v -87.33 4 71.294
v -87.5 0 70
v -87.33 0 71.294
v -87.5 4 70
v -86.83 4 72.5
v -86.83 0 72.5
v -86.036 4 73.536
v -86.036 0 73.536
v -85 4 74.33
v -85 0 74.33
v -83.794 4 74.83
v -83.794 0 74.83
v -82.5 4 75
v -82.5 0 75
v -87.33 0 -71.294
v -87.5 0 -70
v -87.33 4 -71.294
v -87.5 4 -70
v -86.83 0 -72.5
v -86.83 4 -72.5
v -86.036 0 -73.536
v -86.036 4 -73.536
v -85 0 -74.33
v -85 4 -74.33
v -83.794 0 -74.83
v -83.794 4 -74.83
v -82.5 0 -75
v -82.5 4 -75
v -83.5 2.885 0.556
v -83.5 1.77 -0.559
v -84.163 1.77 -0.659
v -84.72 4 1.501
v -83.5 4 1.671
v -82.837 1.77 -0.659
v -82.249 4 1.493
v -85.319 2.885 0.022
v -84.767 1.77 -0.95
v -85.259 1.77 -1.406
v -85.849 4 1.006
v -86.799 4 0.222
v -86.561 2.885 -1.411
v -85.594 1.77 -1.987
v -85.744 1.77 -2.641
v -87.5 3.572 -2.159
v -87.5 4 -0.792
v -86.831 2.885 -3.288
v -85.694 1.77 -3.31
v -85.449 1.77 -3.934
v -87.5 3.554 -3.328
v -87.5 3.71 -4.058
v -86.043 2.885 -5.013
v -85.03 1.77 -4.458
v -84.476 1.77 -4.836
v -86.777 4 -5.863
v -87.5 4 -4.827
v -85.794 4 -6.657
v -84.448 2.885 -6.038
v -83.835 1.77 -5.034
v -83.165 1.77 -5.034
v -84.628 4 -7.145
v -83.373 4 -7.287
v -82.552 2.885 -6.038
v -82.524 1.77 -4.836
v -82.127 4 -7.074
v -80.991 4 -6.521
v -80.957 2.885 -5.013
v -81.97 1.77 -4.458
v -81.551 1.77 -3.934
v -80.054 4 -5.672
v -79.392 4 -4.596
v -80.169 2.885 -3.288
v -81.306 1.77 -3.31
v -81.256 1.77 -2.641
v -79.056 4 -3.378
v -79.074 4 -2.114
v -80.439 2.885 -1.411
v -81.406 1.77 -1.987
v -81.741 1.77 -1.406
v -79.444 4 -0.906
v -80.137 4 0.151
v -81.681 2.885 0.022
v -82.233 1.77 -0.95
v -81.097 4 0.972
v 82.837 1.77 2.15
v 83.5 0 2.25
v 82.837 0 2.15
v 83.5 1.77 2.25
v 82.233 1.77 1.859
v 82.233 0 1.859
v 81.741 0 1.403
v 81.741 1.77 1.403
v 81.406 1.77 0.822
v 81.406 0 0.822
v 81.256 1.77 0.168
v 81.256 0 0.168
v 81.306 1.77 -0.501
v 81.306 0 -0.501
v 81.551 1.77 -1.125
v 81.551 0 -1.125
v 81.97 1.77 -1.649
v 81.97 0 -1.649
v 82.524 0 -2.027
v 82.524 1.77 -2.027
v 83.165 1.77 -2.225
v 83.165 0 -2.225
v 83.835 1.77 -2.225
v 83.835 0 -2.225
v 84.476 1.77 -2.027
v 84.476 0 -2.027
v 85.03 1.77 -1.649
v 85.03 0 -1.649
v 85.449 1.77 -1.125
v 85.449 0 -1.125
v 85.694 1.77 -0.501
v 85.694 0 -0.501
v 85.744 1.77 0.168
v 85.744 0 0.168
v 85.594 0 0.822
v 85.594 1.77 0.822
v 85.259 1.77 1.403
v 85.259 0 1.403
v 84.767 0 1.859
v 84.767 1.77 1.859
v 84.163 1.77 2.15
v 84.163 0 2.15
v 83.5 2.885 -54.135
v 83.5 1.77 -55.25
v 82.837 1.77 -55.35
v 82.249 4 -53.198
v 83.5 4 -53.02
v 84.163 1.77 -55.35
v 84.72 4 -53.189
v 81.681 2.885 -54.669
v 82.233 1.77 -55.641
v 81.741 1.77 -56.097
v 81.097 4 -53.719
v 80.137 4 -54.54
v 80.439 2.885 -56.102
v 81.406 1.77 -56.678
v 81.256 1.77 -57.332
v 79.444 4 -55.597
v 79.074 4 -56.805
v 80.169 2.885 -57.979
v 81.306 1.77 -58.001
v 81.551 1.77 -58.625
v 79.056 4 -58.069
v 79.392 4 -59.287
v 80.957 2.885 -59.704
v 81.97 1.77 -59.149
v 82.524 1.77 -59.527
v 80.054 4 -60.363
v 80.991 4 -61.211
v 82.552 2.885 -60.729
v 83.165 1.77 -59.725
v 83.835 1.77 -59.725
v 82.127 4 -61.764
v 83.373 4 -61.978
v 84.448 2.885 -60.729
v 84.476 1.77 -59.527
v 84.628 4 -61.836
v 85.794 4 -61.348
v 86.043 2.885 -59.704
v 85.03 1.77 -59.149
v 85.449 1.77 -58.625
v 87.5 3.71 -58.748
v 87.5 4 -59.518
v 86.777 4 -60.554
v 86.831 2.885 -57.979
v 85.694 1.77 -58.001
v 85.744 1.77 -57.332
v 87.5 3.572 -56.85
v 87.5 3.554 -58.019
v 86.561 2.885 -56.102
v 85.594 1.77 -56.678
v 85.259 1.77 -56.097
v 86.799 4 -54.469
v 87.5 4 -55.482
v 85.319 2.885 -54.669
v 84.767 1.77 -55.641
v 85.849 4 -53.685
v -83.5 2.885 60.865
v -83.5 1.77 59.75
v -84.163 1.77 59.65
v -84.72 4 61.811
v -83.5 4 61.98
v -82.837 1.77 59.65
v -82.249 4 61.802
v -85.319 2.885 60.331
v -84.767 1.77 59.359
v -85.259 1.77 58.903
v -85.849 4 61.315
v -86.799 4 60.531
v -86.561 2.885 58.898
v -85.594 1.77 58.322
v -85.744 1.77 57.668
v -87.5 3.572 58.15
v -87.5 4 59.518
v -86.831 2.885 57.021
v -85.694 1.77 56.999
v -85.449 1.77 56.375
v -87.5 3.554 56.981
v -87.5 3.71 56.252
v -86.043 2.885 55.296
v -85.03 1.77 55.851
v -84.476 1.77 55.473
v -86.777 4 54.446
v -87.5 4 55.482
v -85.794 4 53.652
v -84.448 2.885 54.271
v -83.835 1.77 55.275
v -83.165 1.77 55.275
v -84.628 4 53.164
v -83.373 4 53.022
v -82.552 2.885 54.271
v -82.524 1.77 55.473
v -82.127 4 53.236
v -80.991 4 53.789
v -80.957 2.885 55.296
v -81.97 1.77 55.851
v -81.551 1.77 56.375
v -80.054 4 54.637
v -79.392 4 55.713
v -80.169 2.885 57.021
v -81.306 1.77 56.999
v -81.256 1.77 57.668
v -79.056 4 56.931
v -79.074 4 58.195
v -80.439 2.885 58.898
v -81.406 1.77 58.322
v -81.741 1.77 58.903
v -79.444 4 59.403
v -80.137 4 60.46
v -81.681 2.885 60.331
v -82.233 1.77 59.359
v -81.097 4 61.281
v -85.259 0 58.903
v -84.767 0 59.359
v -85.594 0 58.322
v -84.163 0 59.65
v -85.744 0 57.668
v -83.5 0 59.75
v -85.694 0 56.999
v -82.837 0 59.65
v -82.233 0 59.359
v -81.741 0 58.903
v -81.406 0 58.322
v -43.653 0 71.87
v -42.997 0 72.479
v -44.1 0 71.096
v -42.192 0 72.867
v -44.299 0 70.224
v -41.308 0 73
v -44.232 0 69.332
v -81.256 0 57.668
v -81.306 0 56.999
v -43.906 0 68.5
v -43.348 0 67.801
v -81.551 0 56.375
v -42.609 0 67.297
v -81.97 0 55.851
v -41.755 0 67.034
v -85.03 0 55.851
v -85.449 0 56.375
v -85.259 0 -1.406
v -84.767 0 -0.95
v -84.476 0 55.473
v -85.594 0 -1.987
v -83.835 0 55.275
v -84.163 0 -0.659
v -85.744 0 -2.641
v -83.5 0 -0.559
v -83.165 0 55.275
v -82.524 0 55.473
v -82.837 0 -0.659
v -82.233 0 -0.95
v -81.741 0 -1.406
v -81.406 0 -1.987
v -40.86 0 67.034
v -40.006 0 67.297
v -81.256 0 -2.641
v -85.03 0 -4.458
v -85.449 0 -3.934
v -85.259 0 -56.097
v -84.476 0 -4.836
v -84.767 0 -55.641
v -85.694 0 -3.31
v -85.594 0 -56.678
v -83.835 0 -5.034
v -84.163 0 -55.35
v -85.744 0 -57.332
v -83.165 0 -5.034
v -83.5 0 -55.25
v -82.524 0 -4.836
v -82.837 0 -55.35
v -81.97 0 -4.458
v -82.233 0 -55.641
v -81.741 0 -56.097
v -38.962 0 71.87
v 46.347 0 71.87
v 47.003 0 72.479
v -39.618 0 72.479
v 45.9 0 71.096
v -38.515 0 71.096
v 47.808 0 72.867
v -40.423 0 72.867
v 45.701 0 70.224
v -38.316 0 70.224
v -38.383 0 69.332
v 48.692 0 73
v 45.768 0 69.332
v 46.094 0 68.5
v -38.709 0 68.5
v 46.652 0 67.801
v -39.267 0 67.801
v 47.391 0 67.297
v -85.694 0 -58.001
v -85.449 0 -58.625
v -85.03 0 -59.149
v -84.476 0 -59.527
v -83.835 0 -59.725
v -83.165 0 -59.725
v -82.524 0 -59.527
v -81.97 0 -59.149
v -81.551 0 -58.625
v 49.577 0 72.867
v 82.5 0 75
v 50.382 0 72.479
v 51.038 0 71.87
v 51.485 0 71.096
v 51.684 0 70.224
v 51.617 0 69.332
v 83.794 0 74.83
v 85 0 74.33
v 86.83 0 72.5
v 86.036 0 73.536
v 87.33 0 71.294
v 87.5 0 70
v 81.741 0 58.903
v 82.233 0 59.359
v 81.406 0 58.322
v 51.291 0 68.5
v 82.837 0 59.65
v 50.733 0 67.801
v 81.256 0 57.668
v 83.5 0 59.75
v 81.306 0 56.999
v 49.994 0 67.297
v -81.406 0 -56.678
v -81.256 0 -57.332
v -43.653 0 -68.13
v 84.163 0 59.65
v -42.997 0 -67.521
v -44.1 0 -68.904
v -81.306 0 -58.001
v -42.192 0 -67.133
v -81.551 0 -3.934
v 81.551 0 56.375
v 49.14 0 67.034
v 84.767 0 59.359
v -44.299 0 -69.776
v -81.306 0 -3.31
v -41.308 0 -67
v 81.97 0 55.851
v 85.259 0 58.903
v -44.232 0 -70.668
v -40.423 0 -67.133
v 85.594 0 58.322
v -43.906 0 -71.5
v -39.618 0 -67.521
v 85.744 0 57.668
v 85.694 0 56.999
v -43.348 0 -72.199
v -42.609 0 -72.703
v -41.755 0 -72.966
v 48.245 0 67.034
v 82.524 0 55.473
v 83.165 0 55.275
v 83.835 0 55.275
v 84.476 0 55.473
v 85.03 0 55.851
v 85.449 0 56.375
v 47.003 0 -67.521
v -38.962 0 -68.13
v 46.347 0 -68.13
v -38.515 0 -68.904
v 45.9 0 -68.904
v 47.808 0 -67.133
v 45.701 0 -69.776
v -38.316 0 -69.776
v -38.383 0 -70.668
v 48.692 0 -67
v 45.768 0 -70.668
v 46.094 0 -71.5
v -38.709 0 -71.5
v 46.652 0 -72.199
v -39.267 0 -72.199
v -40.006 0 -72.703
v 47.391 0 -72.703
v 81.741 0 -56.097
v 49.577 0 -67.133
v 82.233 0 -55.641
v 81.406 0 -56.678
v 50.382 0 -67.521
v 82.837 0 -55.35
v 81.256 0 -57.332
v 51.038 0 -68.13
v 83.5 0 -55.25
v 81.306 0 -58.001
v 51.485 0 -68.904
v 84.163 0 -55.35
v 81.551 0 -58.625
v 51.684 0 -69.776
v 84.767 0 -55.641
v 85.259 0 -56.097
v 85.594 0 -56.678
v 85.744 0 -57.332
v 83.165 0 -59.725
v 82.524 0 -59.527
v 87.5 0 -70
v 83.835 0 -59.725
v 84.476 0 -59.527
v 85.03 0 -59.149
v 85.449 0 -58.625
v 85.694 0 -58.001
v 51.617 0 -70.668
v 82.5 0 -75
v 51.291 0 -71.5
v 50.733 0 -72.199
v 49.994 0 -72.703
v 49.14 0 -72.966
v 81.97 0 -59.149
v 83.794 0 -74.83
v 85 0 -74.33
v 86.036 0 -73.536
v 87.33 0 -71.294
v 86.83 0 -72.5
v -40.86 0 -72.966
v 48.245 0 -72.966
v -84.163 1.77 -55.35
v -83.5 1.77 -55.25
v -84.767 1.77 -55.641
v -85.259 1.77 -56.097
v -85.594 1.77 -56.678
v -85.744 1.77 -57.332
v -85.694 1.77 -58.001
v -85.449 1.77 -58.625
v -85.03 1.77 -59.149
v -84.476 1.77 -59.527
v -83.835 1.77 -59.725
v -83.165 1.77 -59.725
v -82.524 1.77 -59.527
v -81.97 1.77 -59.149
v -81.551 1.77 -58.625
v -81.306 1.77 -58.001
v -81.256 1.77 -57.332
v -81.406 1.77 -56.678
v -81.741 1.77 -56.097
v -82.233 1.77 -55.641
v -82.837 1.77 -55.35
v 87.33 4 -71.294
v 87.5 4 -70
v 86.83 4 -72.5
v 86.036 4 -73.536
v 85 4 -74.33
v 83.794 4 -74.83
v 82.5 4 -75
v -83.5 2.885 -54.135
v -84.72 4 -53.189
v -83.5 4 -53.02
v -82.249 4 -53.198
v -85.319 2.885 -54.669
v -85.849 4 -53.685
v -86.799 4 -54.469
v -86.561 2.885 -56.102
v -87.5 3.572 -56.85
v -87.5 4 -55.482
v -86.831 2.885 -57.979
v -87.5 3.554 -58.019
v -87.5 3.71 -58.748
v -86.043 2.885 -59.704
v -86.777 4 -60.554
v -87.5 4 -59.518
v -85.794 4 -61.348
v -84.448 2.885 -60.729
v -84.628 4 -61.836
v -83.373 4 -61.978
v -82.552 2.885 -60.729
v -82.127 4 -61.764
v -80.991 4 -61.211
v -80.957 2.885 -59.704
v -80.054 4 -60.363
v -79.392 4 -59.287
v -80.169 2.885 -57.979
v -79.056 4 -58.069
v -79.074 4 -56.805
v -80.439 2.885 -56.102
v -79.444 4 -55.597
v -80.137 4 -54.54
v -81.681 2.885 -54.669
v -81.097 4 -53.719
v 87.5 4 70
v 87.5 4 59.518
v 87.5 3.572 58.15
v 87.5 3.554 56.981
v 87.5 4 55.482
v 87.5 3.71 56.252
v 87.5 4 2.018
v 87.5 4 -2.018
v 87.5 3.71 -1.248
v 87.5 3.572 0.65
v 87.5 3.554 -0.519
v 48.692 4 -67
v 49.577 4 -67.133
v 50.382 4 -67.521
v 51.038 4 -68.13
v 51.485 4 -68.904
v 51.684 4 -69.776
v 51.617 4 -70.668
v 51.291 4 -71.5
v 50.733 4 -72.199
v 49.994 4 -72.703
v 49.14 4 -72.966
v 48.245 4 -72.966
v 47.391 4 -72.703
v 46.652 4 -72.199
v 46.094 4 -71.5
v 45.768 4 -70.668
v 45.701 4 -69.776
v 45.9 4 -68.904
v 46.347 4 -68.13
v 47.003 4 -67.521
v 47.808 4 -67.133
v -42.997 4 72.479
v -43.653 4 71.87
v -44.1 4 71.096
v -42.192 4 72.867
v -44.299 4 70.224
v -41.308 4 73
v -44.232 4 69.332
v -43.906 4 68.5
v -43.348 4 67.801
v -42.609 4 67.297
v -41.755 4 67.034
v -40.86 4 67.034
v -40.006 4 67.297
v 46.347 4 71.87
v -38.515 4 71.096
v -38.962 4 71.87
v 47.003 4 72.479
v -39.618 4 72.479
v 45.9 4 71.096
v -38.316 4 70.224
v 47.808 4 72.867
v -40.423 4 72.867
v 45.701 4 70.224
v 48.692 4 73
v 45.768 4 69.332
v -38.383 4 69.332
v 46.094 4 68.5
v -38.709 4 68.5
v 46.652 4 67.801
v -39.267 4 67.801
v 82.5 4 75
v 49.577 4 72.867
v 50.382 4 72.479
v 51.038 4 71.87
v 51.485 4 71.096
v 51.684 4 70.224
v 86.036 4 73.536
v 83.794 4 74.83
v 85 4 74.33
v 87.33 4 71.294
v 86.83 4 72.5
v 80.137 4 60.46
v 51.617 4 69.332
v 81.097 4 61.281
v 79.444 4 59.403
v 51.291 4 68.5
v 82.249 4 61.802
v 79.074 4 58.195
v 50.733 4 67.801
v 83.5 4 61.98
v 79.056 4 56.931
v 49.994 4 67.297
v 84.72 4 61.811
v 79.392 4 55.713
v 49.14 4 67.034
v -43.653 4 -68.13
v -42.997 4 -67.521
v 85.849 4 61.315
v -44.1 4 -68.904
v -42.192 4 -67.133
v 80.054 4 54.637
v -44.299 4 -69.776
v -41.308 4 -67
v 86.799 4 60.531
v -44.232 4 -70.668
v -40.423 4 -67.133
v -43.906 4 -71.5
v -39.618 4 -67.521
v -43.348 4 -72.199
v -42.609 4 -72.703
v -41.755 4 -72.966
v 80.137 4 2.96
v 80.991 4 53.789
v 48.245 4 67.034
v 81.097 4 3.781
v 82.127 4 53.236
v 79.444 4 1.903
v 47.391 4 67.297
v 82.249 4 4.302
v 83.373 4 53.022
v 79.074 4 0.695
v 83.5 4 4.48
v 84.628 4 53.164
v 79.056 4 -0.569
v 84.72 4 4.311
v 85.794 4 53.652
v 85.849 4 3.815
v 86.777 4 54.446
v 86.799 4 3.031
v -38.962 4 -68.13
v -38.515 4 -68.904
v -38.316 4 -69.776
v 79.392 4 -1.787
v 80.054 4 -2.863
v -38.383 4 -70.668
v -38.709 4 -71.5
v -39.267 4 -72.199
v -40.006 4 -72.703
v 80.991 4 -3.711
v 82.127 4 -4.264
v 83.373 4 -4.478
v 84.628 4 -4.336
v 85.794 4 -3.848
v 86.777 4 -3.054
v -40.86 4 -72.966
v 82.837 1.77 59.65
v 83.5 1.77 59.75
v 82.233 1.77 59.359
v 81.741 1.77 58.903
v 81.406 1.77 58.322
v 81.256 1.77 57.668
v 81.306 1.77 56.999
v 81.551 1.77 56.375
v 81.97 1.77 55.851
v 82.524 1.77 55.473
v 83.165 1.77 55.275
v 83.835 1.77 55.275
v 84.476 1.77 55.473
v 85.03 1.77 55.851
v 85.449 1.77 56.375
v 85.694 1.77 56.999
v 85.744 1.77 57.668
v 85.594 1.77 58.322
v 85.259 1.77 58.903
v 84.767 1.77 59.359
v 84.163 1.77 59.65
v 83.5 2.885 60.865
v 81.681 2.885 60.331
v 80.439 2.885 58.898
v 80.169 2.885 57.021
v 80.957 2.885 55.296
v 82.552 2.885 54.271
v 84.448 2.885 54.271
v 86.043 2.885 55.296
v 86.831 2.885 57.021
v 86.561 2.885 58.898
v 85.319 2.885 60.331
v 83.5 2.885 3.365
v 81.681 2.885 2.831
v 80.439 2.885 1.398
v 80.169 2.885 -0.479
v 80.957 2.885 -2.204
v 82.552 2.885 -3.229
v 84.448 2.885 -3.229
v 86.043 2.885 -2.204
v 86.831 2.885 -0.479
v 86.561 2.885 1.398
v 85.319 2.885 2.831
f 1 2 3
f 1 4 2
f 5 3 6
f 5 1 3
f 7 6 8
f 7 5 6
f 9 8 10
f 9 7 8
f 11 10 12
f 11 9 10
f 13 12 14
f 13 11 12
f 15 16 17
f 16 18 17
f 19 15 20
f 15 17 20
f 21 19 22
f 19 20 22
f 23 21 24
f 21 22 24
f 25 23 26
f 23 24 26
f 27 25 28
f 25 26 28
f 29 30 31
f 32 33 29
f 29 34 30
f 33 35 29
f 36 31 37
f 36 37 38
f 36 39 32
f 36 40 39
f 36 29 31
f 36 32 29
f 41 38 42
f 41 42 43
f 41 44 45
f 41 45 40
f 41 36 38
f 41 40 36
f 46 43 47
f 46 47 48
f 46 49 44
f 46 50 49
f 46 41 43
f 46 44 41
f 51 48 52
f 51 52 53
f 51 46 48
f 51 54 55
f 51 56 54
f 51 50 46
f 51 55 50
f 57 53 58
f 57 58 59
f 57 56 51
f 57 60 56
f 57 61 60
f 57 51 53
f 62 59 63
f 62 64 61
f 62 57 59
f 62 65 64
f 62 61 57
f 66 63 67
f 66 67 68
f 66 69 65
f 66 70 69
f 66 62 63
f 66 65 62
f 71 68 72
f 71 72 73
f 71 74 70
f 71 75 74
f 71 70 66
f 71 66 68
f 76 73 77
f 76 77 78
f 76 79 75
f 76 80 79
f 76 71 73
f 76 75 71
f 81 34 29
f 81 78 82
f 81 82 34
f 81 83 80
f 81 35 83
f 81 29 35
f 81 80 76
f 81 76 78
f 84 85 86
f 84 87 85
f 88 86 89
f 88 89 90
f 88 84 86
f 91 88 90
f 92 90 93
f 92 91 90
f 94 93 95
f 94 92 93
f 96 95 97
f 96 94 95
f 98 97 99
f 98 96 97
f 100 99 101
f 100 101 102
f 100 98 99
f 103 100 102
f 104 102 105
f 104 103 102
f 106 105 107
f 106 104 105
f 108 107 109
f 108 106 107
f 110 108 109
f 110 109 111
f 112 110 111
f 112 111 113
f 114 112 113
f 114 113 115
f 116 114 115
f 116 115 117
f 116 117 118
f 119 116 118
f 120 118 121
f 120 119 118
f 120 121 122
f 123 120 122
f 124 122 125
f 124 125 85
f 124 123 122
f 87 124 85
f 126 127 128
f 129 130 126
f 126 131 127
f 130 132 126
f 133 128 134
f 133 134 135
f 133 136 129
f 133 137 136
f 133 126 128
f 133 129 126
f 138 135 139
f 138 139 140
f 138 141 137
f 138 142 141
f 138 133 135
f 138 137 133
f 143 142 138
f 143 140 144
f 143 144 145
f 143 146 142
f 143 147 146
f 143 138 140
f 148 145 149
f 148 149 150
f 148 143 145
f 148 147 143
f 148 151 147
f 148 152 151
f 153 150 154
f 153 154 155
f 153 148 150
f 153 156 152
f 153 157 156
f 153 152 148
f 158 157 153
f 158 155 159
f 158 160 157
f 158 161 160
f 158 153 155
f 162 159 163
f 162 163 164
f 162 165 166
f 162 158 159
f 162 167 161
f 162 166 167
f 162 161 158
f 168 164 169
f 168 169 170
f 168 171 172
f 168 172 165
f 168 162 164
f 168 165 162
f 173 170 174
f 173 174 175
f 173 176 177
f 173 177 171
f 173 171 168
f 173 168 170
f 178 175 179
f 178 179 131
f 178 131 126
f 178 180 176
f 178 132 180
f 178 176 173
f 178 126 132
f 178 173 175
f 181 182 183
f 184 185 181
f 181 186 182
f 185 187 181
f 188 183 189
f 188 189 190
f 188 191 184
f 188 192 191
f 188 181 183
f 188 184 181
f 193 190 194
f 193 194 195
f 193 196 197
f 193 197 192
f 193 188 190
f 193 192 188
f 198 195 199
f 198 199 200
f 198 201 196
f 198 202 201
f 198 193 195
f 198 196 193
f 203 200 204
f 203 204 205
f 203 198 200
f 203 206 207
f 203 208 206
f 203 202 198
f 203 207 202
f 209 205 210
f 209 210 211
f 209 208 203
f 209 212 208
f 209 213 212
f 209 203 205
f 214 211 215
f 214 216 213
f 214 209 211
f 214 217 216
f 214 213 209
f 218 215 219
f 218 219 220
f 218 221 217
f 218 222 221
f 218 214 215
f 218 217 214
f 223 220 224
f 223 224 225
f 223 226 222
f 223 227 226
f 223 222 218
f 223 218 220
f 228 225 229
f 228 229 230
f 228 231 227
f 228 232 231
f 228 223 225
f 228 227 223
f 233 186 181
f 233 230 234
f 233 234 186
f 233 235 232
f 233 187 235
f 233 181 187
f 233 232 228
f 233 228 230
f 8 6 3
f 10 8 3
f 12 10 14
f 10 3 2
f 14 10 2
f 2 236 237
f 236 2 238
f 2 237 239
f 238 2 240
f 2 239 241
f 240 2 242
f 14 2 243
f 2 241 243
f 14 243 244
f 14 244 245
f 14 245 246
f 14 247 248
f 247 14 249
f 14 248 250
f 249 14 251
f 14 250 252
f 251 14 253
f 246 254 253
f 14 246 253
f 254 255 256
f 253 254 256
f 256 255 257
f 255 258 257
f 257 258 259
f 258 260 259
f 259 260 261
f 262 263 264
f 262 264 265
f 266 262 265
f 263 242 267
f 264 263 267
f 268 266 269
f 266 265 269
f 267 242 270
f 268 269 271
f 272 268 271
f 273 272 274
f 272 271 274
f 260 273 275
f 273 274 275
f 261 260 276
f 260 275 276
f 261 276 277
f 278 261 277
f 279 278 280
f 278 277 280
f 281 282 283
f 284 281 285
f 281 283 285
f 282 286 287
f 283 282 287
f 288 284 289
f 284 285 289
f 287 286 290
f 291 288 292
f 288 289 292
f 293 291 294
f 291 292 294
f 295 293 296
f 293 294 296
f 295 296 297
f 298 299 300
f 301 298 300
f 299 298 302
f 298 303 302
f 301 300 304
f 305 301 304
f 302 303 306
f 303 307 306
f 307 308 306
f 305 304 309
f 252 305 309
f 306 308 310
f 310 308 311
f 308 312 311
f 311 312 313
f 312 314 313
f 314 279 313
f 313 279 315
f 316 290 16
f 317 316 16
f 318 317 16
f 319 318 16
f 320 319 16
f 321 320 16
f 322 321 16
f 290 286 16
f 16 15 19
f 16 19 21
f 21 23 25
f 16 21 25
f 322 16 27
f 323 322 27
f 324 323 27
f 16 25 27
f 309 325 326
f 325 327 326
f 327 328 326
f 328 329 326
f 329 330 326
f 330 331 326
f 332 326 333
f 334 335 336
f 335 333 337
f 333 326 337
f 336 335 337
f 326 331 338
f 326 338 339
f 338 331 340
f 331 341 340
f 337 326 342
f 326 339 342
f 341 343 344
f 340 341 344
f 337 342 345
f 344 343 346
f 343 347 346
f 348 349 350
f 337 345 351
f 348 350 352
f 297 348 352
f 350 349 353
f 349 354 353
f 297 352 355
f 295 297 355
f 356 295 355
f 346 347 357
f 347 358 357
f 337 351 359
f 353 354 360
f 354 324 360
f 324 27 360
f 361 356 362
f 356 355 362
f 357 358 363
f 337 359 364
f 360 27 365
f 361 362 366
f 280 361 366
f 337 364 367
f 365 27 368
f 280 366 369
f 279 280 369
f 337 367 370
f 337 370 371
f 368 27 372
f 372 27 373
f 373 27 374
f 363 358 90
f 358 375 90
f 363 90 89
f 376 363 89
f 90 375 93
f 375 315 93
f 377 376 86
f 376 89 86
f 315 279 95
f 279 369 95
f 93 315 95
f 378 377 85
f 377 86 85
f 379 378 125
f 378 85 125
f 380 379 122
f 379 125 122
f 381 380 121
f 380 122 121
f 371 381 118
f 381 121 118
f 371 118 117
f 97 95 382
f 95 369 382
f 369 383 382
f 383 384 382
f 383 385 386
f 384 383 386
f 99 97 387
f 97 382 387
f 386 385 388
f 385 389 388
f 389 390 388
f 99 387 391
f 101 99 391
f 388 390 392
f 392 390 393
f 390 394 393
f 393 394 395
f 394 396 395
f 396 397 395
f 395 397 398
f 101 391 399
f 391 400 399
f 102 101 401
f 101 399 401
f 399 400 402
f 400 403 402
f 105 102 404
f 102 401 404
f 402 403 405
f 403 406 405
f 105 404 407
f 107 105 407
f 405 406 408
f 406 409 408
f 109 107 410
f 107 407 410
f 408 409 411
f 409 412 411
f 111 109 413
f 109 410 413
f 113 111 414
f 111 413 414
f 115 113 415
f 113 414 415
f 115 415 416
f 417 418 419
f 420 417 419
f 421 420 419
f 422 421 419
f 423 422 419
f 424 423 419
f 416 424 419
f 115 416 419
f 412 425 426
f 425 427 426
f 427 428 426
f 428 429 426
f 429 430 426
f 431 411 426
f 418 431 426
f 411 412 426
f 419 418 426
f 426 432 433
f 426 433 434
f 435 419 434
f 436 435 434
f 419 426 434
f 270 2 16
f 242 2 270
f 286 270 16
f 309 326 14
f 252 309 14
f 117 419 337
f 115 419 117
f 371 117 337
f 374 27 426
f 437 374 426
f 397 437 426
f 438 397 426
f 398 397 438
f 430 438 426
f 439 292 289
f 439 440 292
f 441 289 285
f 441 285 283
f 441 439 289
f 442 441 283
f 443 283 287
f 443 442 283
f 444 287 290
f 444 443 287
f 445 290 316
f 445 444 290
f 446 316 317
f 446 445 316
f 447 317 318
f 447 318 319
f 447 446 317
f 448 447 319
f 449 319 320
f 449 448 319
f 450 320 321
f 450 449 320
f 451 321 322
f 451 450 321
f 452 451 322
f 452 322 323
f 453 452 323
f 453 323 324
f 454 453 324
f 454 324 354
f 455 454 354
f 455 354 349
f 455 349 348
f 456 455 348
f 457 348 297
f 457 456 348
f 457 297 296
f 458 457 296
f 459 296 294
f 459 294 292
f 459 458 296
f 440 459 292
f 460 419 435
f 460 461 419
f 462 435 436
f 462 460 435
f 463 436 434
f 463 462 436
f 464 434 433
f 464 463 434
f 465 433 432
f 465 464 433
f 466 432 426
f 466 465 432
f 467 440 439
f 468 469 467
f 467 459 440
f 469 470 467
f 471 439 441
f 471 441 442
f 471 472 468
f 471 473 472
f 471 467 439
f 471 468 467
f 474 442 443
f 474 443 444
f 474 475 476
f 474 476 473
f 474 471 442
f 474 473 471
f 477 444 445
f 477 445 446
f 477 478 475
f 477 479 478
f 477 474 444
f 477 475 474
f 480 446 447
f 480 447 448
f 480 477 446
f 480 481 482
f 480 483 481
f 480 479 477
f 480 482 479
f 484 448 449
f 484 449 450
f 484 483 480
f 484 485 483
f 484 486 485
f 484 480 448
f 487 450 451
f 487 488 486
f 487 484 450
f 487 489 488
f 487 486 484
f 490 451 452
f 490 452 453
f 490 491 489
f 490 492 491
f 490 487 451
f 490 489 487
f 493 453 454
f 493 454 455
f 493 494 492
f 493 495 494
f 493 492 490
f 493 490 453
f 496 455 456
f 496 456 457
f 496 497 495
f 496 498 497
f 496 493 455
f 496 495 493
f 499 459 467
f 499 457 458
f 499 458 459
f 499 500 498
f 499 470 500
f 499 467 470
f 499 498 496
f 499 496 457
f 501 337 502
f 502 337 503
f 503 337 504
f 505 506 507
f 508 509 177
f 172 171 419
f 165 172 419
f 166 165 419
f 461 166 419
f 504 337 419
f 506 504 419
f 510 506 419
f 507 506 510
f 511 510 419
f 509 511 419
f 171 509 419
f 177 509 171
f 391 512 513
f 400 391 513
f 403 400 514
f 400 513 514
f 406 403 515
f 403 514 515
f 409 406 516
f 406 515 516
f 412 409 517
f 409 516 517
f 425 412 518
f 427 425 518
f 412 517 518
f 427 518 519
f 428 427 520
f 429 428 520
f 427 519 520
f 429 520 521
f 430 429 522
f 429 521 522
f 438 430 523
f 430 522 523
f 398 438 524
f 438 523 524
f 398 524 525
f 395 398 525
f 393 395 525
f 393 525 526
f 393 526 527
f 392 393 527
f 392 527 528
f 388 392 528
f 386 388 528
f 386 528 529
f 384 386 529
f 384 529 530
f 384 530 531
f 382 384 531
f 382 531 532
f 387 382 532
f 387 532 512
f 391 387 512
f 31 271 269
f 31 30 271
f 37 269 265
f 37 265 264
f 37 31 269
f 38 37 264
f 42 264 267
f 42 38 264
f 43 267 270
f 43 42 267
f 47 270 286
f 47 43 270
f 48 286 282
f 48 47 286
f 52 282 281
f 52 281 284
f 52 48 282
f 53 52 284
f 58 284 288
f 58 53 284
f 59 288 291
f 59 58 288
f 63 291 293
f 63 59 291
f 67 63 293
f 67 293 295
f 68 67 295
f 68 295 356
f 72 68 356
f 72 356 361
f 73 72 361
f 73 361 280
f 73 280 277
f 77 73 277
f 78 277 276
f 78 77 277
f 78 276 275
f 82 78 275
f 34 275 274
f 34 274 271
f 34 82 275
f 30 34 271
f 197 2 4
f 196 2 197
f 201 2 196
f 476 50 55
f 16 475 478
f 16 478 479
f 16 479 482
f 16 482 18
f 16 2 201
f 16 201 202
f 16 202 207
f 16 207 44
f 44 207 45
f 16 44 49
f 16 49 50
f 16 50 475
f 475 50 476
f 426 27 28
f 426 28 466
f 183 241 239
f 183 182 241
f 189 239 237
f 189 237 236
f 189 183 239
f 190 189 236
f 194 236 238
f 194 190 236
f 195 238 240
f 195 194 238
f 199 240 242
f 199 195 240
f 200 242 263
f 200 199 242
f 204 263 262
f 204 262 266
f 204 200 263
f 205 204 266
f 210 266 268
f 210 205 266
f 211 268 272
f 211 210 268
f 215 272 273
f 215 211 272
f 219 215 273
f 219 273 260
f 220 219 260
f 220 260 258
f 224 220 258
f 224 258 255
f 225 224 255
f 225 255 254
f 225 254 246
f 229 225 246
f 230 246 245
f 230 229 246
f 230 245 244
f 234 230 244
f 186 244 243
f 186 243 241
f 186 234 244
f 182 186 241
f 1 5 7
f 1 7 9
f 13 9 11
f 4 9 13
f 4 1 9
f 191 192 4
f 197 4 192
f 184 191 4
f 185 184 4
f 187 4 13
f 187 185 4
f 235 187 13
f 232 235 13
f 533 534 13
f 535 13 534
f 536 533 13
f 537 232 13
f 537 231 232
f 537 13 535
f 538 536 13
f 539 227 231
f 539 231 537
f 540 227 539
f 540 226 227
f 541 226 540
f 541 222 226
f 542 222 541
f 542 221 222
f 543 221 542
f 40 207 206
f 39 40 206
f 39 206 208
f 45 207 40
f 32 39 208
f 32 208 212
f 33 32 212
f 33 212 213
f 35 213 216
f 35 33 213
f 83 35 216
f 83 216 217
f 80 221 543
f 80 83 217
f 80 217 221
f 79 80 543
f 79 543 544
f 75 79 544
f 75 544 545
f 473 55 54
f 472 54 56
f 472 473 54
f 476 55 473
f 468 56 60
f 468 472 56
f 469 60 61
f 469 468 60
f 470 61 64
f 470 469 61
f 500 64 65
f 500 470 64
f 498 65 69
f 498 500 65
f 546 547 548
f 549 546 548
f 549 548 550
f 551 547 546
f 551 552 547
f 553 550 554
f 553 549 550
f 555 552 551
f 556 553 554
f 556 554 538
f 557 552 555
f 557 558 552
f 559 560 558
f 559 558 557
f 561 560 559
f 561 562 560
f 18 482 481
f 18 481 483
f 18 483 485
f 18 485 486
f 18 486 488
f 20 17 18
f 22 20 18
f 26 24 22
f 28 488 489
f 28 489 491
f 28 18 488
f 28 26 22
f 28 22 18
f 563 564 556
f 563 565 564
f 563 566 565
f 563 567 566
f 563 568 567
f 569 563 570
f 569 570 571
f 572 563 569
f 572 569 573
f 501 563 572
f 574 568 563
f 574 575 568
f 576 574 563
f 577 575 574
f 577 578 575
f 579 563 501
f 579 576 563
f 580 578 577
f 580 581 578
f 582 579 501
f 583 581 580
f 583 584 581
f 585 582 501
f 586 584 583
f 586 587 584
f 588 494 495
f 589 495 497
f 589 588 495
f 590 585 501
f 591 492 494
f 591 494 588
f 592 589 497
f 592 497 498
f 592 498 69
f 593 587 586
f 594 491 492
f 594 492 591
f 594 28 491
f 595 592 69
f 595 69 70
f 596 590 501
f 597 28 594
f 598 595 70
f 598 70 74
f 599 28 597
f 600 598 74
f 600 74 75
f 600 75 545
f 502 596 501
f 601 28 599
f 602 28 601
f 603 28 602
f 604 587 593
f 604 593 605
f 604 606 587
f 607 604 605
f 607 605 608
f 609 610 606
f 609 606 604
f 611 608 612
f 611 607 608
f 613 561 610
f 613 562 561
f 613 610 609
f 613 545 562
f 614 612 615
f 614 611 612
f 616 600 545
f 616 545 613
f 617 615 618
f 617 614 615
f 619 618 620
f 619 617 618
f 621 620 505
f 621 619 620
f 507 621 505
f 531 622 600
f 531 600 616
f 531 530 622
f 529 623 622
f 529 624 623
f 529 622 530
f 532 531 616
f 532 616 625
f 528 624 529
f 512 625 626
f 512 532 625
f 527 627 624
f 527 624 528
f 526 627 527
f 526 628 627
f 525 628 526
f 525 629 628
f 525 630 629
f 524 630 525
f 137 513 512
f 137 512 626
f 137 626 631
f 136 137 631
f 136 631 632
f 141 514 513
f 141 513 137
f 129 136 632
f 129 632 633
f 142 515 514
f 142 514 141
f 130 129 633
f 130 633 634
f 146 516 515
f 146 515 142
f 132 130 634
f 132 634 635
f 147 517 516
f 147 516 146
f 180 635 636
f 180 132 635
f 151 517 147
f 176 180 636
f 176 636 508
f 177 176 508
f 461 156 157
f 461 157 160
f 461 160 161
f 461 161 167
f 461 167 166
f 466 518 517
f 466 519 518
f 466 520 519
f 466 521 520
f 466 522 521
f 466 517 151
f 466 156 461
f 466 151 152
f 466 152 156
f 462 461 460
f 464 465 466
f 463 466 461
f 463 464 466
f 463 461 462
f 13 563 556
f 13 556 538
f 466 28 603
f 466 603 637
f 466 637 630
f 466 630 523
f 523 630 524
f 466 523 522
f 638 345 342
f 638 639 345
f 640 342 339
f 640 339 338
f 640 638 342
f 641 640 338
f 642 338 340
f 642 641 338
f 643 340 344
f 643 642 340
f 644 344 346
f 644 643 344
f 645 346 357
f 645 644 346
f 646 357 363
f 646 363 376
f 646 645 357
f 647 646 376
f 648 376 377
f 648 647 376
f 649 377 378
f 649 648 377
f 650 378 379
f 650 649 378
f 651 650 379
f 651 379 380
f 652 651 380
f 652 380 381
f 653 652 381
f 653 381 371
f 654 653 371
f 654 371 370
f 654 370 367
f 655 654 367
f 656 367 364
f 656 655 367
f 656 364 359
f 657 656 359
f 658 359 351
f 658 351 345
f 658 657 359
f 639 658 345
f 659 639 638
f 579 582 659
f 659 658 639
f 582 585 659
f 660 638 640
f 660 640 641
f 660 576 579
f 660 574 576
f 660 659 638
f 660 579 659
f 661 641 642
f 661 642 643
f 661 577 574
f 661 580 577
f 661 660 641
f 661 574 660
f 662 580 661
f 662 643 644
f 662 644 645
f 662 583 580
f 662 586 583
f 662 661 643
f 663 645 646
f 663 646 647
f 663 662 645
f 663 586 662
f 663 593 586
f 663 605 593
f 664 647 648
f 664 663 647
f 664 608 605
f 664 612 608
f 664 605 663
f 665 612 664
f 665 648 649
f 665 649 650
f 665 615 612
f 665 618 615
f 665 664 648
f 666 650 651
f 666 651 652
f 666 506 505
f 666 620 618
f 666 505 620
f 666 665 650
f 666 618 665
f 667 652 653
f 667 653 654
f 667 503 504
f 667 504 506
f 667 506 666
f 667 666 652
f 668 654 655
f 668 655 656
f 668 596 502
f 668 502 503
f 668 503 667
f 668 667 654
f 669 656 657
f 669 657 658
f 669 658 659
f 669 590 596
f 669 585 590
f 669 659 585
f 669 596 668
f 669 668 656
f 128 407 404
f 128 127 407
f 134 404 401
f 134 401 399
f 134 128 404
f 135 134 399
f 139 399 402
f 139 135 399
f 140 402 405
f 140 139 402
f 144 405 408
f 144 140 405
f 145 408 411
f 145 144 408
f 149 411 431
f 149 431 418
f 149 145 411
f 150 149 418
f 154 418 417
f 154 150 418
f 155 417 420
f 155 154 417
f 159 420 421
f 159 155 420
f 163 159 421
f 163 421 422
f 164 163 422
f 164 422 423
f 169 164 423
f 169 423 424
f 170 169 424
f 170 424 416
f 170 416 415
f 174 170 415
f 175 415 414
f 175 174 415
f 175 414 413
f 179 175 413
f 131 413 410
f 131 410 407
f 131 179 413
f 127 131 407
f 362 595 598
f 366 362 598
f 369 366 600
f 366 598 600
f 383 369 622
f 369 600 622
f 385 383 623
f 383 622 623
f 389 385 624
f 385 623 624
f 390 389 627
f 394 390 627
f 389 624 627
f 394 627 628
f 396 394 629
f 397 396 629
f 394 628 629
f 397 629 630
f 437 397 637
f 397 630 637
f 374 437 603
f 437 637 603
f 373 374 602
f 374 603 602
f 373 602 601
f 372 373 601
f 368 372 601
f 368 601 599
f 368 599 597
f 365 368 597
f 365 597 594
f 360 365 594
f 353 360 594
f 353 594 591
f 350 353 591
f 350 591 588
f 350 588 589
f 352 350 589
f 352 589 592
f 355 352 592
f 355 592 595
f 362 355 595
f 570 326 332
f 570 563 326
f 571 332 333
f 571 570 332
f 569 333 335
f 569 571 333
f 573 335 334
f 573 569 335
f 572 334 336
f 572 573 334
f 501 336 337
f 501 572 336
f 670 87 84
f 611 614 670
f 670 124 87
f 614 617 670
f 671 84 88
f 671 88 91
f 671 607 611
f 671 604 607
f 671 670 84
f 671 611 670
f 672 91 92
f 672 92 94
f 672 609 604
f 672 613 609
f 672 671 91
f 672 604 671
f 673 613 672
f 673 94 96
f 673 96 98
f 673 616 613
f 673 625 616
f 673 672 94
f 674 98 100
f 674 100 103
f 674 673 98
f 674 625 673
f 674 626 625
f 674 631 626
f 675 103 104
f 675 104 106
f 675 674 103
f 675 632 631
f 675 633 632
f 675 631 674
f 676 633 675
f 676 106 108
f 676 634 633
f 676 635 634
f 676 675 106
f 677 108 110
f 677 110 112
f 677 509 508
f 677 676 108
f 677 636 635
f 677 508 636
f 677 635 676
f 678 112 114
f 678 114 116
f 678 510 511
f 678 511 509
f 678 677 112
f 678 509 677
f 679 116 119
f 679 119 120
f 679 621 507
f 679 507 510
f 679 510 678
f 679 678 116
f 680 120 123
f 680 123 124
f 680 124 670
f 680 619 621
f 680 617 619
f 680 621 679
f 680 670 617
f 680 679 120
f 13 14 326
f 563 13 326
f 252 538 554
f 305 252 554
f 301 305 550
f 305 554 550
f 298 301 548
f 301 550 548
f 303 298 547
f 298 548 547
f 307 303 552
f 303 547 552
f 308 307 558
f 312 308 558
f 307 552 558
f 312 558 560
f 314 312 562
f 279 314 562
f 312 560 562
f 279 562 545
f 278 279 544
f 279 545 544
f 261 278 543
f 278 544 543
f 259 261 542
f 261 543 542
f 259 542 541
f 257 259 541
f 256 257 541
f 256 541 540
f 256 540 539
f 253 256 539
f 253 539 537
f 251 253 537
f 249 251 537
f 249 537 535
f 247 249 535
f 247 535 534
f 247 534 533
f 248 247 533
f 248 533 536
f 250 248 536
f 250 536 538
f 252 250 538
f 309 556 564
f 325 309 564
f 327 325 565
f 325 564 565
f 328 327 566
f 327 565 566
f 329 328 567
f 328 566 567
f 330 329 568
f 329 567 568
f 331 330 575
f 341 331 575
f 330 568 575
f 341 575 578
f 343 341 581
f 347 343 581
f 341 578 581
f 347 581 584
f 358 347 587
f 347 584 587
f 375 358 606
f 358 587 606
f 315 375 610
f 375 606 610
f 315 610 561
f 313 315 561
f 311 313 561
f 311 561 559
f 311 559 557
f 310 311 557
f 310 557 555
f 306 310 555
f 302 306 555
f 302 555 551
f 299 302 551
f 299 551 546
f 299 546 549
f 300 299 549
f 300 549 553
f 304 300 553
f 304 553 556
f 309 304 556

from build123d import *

# Parameters (mm, degrees)
IZIM1_W                       = 175
IZIM1_H                       = 150
Y_KSEKLIK_EKSTR_ZYON1_DEPTH   = 4
RADYUS1_R                     = 5
IZIM2_R                       = 2
IZIM2_R_2                     = 3
KES_EKSTR_ZYON1_DEPTH         = 10
M4_SFHCS_IN_HAV_A1_AT_2_COUNT = 2
M4_SFHCS_IN_HAV_A1_AT_2_PITCH = 54.690877802
M4_SFHCS_IN_HAV_A1_AT_3_COUNT = 2
M4_SFHCS_IN_HAV_A1_AT_3_PITCH = 115
M4_SFHCS_IN_HAV_A1_AT_4_COUNT = 2
M4_SFHCS_IN_HAV_A1_AT_4_PITCH = 202.765874841
M4_SFHCS_IN_HAV_A1_AT_5_COUNT = 2
M4_SFHCS_IN_HAV_A1_AT_5_PITCH = 176.621771025
M4_SFHCS_IN_HAV_A1_AT_6_COUNT = 2
M4_SFHCS_IN_HAV_A1_AT_6_PITCH = 167


with BuildPart() as part:
    # Çizim1 → Yükseklik-Ekstrüzyon1 (new body)
    with BuildSketch(Plane(origin=(0, 0, 0), x_dir=(1, 0, 0), z_dir=(0, 1, 0))):
        Rectangle(IZIM1_W, IZIM1_H)
    extrude(amount=Y_KSEKLIK_EKSTR_ZYON1_DEPTH)

    # Radyus1
    radyus1_edges = [part.edges().sort_by_distance(p)[0] for p in [
        (-87.5, 2, -75),
        (87.5, 2, -75),
        (87.5, 2, 75),
        (-87.5, 2, 75),
    ]]
    fillet(radyus1_edges, radius=RADYUS1_R)

    # Çizim2 → Kes-Ekstrüzyon1 (cut)
    with BuildSketch(Plane(origin=(0, 4, 0), x_dir=(1, 0, 0), z_dir=(0, 1, 0))):
        with Locations(Location((-83.5, -57.5, 0), (0, 0, 270))):
            Circle(IZIM2_R)
        with Locations(Location((83.5, -57.5, 0), (0, 0, 270))):
            Circle(IZIM2_R)
        with Locations(Location((83.5, 0, 0), (0, 0, 270))):
            Circle(IZIM2_R)
        with Locations(Location((83.5, 57.5, 0), (0, 0, 270))):
            Circle(IZIM2_R)
        with Locations(Location((-83.5, 57.5, 0), (0, 0, 270))):
            Circle(IZIM2_R)
        with Locations(Location((-83.5, 2.809122198, 0), (0, 0, 270))):
            Circle(IZIM2_R)
        with Locations(Location((-41.307504104, -70, 0), (0, 0, 270))):
            Circle(IZIM2_R_2)
        with Locations(Location((48.692495896, -70, 0), (0, 0, 270))):
            Circle(IZIM2_R_2)
        with Locations(Location((-41.307504104, 70, 0), (0, 0, 270))):
            Circle(IZIM2_R_2)
        with Locations(Location((48.692495896, 70, 0), (0, 0, 270))):
            Circle(IZIM2_R_2)
    extrude(amount=-KES_EKSTR_ZYON1_DEPTH, mode=Mode.SUBTRACT)

    # Çizim3 → M4 SFHCS İçin Havşa1 (revolve, cut)
    with BuildSketch(Plane(origin=(-83.5, 4, -57.5), x_dir=(0, 0, 1), z_dir=(1, 0, 0))):
        Polygon((0, 0), (0, 4), (2.25, 4), (2.25, 2.23), (4.48, 0), align=None)
    m4_sfhcs_in_hav_a1 = revolve(axis=Axis((-83.5, 10.35, -57.5), (0, -1, 0)), mode=Mode.SUBTRACT)

    # M4 SFHCS İçin Havşa1 at 2: M4 SFHCS İçin Havşa1 ×2
    with Locations(*[(0, 0, i * M4_SFHCS_IN_HAV_A1_AT_2_PITCH) for i in range(1, M4_SFHCS_IN_HAV_A1_AT_2_COUNT)]):
        add(m4_sfhcs_in_hav_a1, mode=Mode.SUBTRACT)

    # M4 SFHCS İçin Havşa1 at 3: M4 SFHCS İçin Havşa1 ×2
    with Locations(*[(0, 0, i * M4_SFHCS_IN_HAV_A1_AT_3_PITCH) for i in range(1, M4_SFHCS_IN_HAV_A1_AT_3_COUNT)]):
        add(m4_sfhcs_in_hav_a1, mode=Mode.SUBTRACT)

    # M4 SFHCS İçin Havşa1 at 4: M4 SFHCS İçin Havşa1 ×2
    with Locations(*[Vector(0.8236099892599149, 0, 0.5671565794304804) * (i * M4_SFHCS_IN_HAV_A1_AT_4_PITCH) for i in range(1, M4_SFHCS_IN_HAV_A1_AT_4_COUNT)]):
        add(m4_sfhcs_in_hav_a1, mode=Mode.SUBTRACT)

    # M4 SFHCS İçin Havşa1 at 5: M4 SFHCS İçin Havşa1 ×2
    with Locations(*[Vector(0.9455233011811556, 0, 0.3255544300474038) * (i * M4_SFHCS_IN_HAV_A1_AT_5_PITCH) for i in range(1, M4_SFHCS_IN_HAV_A1_AT_5_COUNT)]):
        add(m4_sfhcs_in_hav_a1, mode=Mode.SUBTRACT)

    # M4 SFHCS İçin Havşa1 at 6: M4 SFHCS İçin Havşa1 ×2
    with Locations(*[(i * M4_SFHCS_IN_HAV_A1_AT_6_PITCH, 0, 0) for i in range(1, M4_SFHCS_IN_HAV_A1_AT_6_COUNT)]):
        add(m4_sfhcs_in_hav_a1, mode=Mode.SUBTRACT)


solid = part.part
